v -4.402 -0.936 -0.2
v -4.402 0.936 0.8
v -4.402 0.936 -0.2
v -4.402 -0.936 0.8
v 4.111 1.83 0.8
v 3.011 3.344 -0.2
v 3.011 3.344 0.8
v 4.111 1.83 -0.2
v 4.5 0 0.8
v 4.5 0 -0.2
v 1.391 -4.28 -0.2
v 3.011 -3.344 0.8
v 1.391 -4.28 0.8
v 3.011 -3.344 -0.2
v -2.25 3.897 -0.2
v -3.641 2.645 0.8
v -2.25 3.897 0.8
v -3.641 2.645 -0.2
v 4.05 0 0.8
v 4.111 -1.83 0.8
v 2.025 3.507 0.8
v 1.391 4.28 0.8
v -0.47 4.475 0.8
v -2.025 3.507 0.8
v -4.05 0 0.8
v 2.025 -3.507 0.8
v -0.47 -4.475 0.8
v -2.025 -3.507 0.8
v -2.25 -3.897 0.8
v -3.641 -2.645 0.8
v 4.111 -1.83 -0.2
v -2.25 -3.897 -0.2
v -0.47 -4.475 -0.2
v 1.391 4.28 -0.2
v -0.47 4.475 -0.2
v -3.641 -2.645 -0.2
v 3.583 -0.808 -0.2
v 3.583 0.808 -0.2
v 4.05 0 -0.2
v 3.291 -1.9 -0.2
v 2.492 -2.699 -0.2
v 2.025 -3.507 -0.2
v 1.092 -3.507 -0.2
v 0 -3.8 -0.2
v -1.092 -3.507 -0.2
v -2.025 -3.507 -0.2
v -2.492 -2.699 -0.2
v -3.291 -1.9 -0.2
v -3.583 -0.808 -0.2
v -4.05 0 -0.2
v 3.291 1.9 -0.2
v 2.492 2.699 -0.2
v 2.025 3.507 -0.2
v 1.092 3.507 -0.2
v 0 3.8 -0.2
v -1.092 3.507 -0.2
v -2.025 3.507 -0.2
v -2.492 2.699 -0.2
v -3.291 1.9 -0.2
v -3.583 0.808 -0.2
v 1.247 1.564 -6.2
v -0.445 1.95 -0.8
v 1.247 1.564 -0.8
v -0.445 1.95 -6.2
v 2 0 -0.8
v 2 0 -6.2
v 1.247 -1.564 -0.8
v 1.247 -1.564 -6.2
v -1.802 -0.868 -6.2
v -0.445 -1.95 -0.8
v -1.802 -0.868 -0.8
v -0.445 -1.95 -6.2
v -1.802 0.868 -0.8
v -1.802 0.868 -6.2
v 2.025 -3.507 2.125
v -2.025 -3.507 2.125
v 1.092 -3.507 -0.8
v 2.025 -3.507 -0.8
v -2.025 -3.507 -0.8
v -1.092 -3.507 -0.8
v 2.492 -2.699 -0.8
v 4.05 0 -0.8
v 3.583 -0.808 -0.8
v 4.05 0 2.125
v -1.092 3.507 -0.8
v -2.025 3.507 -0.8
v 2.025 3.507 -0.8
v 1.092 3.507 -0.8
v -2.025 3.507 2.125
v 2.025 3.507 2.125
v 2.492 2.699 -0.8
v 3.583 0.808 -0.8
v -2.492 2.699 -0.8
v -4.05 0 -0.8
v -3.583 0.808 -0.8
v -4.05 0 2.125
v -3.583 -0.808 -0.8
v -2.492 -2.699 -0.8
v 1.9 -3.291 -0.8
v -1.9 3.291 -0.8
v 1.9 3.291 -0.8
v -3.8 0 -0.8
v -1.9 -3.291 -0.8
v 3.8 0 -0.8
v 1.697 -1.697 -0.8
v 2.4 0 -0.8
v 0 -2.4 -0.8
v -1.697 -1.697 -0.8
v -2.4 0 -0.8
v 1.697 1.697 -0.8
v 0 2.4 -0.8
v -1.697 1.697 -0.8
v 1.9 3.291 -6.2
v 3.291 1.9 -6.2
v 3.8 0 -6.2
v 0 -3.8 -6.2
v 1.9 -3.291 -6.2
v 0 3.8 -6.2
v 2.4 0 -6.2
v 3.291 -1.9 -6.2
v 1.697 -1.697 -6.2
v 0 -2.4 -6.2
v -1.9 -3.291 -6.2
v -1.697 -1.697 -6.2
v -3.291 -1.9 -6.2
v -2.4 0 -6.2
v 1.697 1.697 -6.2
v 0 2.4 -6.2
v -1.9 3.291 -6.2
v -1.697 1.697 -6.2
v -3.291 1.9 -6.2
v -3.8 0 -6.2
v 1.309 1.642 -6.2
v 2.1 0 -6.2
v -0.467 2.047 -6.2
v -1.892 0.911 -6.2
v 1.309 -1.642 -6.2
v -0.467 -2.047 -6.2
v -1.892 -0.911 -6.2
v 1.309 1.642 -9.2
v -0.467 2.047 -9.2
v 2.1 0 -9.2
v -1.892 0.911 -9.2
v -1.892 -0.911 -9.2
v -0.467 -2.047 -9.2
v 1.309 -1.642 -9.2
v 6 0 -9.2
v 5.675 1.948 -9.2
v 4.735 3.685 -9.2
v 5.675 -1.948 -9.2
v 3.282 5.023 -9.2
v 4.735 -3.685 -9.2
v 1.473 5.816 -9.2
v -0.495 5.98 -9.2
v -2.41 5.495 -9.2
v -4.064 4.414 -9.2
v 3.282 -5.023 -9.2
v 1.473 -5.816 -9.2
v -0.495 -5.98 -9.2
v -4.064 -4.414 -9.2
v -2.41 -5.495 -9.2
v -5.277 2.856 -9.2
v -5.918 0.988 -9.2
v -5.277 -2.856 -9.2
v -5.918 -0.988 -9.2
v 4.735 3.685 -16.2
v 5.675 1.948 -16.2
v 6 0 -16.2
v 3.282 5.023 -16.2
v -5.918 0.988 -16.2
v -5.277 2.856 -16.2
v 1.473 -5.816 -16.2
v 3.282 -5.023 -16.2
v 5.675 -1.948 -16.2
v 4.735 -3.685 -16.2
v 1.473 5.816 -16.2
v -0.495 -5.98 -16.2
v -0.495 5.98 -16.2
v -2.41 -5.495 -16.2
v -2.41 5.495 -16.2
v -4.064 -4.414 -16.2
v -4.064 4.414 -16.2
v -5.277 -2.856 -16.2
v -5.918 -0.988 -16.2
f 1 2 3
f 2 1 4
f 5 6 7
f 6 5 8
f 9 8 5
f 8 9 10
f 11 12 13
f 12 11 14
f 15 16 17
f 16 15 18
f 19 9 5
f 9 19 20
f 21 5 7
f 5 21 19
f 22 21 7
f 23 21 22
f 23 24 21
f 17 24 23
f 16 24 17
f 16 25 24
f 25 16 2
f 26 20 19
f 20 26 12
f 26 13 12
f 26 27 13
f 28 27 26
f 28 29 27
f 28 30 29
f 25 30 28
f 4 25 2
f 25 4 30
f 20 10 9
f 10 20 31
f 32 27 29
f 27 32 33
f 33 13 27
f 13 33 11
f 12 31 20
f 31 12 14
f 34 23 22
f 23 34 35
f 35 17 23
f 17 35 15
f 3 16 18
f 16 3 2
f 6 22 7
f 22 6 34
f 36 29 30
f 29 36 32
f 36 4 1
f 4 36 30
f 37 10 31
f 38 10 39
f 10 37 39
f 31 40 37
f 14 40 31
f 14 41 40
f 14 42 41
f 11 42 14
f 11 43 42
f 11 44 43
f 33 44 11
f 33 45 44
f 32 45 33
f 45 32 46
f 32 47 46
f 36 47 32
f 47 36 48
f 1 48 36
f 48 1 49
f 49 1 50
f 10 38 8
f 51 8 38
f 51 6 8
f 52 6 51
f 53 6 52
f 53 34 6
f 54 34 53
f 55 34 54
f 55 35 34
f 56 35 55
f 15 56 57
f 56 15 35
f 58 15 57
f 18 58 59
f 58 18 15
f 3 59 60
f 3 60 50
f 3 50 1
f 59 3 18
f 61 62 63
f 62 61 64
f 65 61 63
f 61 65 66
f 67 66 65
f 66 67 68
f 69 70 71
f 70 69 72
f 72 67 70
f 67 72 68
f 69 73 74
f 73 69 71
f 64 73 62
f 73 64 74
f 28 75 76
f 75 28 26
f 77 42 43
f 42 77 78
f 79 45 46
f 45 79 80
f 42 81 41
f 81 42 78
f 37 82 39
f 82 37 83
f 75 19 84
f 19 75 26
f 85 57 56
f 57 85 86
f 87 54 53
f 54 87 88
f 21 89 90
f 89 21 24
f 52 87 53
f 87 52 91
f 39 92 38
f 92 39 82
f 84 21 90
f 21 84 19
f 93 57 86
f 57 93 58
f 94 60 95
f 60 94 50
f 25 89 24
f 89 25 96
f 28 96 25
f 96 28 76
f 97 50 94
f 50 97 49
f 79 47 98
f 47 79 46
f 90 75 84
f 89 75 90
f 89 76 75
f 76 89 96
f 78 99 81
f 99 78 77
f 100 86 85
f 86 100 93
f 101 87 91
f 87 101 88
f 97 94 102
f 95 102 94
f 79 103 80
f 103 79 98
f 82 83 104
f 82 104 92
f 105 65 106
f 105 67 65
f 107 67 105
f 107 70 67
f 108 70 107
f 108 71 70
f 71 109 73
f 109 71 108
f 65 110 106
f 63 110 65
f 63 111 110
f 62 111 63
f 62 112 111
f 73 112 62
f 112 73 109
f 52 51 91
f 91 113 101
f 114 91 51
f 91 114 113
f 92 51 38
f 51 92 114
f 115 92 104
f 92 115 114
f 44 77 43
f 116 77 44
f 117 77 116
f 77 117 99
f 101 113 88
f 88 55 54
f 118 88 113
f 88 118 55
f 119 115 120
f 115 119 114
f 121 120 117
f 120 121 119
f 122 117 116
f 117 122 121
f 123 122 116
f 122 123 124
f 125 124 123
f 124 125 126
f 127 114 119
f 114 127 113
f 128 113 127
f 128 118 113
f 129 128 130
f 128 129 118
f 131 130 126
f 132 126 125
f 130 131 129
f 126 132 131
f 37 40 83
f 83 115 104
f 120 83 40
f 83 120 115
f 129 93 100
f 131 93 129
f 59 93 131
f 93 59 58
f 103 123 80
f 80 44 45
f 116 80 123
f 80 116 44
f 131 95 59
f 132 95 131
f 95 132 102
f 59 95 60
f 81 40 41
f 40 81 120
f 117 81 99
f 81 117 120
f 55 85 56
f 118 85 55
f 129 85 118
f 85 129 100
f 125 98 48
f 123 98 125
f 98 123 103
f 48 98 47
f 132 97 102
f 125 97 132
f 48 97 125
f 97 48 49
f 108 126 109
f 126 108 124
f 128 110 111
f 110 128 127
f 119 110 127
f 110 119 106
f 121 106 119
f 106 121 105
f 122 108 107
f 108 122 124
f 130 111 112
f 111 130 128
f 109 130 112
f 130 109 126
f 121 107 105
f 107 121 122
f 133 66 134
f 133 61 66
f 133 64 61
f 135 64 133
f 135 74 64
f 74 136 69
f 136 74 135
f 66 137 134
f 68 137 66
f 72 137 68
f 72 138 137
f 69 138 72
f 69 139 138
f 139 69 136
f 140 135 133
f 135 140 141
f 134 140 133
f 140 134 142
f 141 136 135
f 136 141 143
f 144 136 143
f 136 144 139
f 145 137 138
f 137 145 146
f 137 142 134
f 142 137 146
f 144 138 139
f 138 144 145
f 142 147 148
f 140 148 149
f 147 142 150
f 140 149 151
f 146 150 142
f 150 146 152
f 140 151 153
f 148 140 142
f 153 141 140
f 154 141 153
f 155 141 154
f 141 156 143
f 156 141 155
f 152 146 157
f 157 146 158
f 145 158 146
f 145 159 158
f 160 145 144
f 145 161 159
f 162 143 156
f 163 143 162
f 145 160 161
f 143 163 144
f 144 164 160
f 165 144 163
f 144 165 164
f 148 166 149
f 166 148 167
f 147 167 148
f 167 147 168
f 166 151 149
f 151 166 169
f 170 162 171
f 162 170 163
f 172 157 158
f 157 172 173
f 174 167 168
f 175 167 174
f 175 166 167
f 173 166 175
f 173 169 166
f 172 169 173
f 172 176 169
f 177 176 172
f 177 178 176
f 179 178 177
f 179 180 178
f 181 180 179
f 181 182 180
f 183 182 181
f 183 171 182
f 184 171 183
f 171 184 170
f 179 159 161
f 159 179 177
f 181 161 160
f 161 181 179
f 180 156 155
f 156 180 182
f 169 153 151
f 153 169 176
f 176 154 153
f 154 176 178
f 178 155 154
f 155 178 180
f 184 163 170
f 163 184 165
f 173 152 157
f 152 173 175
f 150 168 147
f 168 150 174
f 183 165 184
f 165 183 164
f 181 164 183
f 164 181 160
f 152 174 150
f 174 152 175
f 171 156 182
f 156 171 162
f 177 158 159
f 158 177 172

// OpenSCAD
// Parameters
shaft_diameter_mm = 4; //[2:8:0.1]
shaft_radius_mm = 2; //[1:4:0.1]
length_under_head_mm = 10; //[5:20:0.5]
head_diameter_across_corners_mm = 8.1; //[4.05:16.2:0.1]
head_height_mm = 2.925; //[1.4625:5.85:0.025]
tip_length_mm = 1.2; //[0.6:2.4:0.1]
tip_radius_factor = 0.25; //[0.05:0.6:0.05]
overlap_mm = 0.8; //[0.2:2:0.1]
washer_outer_diameter_mm = 9; //[6:18:0.1]
washer_thickness_mm = 1; //[0.5:2:0.1]
spacer_height_mm = 6; //[3:12:0.5]
spacer_wall_mm = 1.8; //[0.9:3.6:0.1]
buzzer_diameter_mm = 12; //[6:24:0.5]
buzzer_height_mm = 7; //[3.5:14:0.5]
buzzer_post_diameter_mm = 4.2; //[3:6:0.1]
buzzer_post_height_mm = 3; //[1.5:6:0.5]

// Screw and Washer - complete geometry
module screw_and_washer() {
  color("DimGray") {
    // Screw Shaft
    translate([0, 0, -(length_under_head_mm - tip_length_mm)/2])
      cylinder(h=length_under_head_mm - tip_length_mm, r=shaft_radius_mm, center=true);
    
    // Shaft Tip
    translate([0, 0, -(length_under_head_mm - tip_length_mm) - tip_length_mm/2 + overlap_mm])
      cylinder(h=tip_length_mm, r1=shaft_radius_mm, r2=shaft_radius_mm * tip_radius_factor, center=true);
    
    // Hex Head
    translate([0, 0, head_height_mm/2 - overlap_mm])
      cylinder(h=head_height_mm, r=head_diameter_across_corners_mm/2, center=true, $fn=6);
    
    // Washer
    difference() {
      translate([0, 0, -washer_thickness_mm/2 + overlap_mm])
        cylinder(h=washer_thickness_mm, r=washer_outer_diameter_mm/2, center=true);
      translate([0, 0, -washer_thickness_mm/2 + overlap_mm])
        cylinder(h=washer_thickness_mm + 2*overlap_mm, r=shaft_radius_mm + overlap_mm/2, center=true);
    }
  }
}

// PCB Spacer - complete geometry
module pcb_spacer() {
  color("Silver") {
    difference() {
      translate([0, 0, -washer_thickness_mm - spacer_height_mm/2 + overlap_mm])
        cylinder(h=spacer_height_mm, r=shaft_radius_mm + spacer_wall_mm, center=true);
      translate([0, 0, -washer_thickness_mm - spacer_height_mm/2 + overlap_mm])
        cylinder(h=spacer_height_mm + 2*overlap_mm, r=shaft_radius_mm + overlap_mm/2, center=true);
    }
  }
}

// Buzzer - complete geometry
module buzzer() {
  color("Black") {
    // Buzzer Post
    translate([0, 0, -washer_thickness_mm - spacer_height_mm - buzzer_post_height_mm/2 + overlap_mm])
      cylinder(h=buzzer_post_height_mm, r=buzzer_post_diameter_mm/2, center=true);
    
    // Buzzer Body
    translate([0, 0, -washer_thickness_mm - spacer_height_mm - buzzer_post_height_mm - buzzer_height_mm/2 + overlap_mm])
      cylinder(h=buzzer_height_mm, r=buzzer_diameter_mm/2, center=true);
  }
}

// Assembly
module assembly() {
  screw_and_washer();
  pcb_spacer();
  buzzer();
}

assembly();
